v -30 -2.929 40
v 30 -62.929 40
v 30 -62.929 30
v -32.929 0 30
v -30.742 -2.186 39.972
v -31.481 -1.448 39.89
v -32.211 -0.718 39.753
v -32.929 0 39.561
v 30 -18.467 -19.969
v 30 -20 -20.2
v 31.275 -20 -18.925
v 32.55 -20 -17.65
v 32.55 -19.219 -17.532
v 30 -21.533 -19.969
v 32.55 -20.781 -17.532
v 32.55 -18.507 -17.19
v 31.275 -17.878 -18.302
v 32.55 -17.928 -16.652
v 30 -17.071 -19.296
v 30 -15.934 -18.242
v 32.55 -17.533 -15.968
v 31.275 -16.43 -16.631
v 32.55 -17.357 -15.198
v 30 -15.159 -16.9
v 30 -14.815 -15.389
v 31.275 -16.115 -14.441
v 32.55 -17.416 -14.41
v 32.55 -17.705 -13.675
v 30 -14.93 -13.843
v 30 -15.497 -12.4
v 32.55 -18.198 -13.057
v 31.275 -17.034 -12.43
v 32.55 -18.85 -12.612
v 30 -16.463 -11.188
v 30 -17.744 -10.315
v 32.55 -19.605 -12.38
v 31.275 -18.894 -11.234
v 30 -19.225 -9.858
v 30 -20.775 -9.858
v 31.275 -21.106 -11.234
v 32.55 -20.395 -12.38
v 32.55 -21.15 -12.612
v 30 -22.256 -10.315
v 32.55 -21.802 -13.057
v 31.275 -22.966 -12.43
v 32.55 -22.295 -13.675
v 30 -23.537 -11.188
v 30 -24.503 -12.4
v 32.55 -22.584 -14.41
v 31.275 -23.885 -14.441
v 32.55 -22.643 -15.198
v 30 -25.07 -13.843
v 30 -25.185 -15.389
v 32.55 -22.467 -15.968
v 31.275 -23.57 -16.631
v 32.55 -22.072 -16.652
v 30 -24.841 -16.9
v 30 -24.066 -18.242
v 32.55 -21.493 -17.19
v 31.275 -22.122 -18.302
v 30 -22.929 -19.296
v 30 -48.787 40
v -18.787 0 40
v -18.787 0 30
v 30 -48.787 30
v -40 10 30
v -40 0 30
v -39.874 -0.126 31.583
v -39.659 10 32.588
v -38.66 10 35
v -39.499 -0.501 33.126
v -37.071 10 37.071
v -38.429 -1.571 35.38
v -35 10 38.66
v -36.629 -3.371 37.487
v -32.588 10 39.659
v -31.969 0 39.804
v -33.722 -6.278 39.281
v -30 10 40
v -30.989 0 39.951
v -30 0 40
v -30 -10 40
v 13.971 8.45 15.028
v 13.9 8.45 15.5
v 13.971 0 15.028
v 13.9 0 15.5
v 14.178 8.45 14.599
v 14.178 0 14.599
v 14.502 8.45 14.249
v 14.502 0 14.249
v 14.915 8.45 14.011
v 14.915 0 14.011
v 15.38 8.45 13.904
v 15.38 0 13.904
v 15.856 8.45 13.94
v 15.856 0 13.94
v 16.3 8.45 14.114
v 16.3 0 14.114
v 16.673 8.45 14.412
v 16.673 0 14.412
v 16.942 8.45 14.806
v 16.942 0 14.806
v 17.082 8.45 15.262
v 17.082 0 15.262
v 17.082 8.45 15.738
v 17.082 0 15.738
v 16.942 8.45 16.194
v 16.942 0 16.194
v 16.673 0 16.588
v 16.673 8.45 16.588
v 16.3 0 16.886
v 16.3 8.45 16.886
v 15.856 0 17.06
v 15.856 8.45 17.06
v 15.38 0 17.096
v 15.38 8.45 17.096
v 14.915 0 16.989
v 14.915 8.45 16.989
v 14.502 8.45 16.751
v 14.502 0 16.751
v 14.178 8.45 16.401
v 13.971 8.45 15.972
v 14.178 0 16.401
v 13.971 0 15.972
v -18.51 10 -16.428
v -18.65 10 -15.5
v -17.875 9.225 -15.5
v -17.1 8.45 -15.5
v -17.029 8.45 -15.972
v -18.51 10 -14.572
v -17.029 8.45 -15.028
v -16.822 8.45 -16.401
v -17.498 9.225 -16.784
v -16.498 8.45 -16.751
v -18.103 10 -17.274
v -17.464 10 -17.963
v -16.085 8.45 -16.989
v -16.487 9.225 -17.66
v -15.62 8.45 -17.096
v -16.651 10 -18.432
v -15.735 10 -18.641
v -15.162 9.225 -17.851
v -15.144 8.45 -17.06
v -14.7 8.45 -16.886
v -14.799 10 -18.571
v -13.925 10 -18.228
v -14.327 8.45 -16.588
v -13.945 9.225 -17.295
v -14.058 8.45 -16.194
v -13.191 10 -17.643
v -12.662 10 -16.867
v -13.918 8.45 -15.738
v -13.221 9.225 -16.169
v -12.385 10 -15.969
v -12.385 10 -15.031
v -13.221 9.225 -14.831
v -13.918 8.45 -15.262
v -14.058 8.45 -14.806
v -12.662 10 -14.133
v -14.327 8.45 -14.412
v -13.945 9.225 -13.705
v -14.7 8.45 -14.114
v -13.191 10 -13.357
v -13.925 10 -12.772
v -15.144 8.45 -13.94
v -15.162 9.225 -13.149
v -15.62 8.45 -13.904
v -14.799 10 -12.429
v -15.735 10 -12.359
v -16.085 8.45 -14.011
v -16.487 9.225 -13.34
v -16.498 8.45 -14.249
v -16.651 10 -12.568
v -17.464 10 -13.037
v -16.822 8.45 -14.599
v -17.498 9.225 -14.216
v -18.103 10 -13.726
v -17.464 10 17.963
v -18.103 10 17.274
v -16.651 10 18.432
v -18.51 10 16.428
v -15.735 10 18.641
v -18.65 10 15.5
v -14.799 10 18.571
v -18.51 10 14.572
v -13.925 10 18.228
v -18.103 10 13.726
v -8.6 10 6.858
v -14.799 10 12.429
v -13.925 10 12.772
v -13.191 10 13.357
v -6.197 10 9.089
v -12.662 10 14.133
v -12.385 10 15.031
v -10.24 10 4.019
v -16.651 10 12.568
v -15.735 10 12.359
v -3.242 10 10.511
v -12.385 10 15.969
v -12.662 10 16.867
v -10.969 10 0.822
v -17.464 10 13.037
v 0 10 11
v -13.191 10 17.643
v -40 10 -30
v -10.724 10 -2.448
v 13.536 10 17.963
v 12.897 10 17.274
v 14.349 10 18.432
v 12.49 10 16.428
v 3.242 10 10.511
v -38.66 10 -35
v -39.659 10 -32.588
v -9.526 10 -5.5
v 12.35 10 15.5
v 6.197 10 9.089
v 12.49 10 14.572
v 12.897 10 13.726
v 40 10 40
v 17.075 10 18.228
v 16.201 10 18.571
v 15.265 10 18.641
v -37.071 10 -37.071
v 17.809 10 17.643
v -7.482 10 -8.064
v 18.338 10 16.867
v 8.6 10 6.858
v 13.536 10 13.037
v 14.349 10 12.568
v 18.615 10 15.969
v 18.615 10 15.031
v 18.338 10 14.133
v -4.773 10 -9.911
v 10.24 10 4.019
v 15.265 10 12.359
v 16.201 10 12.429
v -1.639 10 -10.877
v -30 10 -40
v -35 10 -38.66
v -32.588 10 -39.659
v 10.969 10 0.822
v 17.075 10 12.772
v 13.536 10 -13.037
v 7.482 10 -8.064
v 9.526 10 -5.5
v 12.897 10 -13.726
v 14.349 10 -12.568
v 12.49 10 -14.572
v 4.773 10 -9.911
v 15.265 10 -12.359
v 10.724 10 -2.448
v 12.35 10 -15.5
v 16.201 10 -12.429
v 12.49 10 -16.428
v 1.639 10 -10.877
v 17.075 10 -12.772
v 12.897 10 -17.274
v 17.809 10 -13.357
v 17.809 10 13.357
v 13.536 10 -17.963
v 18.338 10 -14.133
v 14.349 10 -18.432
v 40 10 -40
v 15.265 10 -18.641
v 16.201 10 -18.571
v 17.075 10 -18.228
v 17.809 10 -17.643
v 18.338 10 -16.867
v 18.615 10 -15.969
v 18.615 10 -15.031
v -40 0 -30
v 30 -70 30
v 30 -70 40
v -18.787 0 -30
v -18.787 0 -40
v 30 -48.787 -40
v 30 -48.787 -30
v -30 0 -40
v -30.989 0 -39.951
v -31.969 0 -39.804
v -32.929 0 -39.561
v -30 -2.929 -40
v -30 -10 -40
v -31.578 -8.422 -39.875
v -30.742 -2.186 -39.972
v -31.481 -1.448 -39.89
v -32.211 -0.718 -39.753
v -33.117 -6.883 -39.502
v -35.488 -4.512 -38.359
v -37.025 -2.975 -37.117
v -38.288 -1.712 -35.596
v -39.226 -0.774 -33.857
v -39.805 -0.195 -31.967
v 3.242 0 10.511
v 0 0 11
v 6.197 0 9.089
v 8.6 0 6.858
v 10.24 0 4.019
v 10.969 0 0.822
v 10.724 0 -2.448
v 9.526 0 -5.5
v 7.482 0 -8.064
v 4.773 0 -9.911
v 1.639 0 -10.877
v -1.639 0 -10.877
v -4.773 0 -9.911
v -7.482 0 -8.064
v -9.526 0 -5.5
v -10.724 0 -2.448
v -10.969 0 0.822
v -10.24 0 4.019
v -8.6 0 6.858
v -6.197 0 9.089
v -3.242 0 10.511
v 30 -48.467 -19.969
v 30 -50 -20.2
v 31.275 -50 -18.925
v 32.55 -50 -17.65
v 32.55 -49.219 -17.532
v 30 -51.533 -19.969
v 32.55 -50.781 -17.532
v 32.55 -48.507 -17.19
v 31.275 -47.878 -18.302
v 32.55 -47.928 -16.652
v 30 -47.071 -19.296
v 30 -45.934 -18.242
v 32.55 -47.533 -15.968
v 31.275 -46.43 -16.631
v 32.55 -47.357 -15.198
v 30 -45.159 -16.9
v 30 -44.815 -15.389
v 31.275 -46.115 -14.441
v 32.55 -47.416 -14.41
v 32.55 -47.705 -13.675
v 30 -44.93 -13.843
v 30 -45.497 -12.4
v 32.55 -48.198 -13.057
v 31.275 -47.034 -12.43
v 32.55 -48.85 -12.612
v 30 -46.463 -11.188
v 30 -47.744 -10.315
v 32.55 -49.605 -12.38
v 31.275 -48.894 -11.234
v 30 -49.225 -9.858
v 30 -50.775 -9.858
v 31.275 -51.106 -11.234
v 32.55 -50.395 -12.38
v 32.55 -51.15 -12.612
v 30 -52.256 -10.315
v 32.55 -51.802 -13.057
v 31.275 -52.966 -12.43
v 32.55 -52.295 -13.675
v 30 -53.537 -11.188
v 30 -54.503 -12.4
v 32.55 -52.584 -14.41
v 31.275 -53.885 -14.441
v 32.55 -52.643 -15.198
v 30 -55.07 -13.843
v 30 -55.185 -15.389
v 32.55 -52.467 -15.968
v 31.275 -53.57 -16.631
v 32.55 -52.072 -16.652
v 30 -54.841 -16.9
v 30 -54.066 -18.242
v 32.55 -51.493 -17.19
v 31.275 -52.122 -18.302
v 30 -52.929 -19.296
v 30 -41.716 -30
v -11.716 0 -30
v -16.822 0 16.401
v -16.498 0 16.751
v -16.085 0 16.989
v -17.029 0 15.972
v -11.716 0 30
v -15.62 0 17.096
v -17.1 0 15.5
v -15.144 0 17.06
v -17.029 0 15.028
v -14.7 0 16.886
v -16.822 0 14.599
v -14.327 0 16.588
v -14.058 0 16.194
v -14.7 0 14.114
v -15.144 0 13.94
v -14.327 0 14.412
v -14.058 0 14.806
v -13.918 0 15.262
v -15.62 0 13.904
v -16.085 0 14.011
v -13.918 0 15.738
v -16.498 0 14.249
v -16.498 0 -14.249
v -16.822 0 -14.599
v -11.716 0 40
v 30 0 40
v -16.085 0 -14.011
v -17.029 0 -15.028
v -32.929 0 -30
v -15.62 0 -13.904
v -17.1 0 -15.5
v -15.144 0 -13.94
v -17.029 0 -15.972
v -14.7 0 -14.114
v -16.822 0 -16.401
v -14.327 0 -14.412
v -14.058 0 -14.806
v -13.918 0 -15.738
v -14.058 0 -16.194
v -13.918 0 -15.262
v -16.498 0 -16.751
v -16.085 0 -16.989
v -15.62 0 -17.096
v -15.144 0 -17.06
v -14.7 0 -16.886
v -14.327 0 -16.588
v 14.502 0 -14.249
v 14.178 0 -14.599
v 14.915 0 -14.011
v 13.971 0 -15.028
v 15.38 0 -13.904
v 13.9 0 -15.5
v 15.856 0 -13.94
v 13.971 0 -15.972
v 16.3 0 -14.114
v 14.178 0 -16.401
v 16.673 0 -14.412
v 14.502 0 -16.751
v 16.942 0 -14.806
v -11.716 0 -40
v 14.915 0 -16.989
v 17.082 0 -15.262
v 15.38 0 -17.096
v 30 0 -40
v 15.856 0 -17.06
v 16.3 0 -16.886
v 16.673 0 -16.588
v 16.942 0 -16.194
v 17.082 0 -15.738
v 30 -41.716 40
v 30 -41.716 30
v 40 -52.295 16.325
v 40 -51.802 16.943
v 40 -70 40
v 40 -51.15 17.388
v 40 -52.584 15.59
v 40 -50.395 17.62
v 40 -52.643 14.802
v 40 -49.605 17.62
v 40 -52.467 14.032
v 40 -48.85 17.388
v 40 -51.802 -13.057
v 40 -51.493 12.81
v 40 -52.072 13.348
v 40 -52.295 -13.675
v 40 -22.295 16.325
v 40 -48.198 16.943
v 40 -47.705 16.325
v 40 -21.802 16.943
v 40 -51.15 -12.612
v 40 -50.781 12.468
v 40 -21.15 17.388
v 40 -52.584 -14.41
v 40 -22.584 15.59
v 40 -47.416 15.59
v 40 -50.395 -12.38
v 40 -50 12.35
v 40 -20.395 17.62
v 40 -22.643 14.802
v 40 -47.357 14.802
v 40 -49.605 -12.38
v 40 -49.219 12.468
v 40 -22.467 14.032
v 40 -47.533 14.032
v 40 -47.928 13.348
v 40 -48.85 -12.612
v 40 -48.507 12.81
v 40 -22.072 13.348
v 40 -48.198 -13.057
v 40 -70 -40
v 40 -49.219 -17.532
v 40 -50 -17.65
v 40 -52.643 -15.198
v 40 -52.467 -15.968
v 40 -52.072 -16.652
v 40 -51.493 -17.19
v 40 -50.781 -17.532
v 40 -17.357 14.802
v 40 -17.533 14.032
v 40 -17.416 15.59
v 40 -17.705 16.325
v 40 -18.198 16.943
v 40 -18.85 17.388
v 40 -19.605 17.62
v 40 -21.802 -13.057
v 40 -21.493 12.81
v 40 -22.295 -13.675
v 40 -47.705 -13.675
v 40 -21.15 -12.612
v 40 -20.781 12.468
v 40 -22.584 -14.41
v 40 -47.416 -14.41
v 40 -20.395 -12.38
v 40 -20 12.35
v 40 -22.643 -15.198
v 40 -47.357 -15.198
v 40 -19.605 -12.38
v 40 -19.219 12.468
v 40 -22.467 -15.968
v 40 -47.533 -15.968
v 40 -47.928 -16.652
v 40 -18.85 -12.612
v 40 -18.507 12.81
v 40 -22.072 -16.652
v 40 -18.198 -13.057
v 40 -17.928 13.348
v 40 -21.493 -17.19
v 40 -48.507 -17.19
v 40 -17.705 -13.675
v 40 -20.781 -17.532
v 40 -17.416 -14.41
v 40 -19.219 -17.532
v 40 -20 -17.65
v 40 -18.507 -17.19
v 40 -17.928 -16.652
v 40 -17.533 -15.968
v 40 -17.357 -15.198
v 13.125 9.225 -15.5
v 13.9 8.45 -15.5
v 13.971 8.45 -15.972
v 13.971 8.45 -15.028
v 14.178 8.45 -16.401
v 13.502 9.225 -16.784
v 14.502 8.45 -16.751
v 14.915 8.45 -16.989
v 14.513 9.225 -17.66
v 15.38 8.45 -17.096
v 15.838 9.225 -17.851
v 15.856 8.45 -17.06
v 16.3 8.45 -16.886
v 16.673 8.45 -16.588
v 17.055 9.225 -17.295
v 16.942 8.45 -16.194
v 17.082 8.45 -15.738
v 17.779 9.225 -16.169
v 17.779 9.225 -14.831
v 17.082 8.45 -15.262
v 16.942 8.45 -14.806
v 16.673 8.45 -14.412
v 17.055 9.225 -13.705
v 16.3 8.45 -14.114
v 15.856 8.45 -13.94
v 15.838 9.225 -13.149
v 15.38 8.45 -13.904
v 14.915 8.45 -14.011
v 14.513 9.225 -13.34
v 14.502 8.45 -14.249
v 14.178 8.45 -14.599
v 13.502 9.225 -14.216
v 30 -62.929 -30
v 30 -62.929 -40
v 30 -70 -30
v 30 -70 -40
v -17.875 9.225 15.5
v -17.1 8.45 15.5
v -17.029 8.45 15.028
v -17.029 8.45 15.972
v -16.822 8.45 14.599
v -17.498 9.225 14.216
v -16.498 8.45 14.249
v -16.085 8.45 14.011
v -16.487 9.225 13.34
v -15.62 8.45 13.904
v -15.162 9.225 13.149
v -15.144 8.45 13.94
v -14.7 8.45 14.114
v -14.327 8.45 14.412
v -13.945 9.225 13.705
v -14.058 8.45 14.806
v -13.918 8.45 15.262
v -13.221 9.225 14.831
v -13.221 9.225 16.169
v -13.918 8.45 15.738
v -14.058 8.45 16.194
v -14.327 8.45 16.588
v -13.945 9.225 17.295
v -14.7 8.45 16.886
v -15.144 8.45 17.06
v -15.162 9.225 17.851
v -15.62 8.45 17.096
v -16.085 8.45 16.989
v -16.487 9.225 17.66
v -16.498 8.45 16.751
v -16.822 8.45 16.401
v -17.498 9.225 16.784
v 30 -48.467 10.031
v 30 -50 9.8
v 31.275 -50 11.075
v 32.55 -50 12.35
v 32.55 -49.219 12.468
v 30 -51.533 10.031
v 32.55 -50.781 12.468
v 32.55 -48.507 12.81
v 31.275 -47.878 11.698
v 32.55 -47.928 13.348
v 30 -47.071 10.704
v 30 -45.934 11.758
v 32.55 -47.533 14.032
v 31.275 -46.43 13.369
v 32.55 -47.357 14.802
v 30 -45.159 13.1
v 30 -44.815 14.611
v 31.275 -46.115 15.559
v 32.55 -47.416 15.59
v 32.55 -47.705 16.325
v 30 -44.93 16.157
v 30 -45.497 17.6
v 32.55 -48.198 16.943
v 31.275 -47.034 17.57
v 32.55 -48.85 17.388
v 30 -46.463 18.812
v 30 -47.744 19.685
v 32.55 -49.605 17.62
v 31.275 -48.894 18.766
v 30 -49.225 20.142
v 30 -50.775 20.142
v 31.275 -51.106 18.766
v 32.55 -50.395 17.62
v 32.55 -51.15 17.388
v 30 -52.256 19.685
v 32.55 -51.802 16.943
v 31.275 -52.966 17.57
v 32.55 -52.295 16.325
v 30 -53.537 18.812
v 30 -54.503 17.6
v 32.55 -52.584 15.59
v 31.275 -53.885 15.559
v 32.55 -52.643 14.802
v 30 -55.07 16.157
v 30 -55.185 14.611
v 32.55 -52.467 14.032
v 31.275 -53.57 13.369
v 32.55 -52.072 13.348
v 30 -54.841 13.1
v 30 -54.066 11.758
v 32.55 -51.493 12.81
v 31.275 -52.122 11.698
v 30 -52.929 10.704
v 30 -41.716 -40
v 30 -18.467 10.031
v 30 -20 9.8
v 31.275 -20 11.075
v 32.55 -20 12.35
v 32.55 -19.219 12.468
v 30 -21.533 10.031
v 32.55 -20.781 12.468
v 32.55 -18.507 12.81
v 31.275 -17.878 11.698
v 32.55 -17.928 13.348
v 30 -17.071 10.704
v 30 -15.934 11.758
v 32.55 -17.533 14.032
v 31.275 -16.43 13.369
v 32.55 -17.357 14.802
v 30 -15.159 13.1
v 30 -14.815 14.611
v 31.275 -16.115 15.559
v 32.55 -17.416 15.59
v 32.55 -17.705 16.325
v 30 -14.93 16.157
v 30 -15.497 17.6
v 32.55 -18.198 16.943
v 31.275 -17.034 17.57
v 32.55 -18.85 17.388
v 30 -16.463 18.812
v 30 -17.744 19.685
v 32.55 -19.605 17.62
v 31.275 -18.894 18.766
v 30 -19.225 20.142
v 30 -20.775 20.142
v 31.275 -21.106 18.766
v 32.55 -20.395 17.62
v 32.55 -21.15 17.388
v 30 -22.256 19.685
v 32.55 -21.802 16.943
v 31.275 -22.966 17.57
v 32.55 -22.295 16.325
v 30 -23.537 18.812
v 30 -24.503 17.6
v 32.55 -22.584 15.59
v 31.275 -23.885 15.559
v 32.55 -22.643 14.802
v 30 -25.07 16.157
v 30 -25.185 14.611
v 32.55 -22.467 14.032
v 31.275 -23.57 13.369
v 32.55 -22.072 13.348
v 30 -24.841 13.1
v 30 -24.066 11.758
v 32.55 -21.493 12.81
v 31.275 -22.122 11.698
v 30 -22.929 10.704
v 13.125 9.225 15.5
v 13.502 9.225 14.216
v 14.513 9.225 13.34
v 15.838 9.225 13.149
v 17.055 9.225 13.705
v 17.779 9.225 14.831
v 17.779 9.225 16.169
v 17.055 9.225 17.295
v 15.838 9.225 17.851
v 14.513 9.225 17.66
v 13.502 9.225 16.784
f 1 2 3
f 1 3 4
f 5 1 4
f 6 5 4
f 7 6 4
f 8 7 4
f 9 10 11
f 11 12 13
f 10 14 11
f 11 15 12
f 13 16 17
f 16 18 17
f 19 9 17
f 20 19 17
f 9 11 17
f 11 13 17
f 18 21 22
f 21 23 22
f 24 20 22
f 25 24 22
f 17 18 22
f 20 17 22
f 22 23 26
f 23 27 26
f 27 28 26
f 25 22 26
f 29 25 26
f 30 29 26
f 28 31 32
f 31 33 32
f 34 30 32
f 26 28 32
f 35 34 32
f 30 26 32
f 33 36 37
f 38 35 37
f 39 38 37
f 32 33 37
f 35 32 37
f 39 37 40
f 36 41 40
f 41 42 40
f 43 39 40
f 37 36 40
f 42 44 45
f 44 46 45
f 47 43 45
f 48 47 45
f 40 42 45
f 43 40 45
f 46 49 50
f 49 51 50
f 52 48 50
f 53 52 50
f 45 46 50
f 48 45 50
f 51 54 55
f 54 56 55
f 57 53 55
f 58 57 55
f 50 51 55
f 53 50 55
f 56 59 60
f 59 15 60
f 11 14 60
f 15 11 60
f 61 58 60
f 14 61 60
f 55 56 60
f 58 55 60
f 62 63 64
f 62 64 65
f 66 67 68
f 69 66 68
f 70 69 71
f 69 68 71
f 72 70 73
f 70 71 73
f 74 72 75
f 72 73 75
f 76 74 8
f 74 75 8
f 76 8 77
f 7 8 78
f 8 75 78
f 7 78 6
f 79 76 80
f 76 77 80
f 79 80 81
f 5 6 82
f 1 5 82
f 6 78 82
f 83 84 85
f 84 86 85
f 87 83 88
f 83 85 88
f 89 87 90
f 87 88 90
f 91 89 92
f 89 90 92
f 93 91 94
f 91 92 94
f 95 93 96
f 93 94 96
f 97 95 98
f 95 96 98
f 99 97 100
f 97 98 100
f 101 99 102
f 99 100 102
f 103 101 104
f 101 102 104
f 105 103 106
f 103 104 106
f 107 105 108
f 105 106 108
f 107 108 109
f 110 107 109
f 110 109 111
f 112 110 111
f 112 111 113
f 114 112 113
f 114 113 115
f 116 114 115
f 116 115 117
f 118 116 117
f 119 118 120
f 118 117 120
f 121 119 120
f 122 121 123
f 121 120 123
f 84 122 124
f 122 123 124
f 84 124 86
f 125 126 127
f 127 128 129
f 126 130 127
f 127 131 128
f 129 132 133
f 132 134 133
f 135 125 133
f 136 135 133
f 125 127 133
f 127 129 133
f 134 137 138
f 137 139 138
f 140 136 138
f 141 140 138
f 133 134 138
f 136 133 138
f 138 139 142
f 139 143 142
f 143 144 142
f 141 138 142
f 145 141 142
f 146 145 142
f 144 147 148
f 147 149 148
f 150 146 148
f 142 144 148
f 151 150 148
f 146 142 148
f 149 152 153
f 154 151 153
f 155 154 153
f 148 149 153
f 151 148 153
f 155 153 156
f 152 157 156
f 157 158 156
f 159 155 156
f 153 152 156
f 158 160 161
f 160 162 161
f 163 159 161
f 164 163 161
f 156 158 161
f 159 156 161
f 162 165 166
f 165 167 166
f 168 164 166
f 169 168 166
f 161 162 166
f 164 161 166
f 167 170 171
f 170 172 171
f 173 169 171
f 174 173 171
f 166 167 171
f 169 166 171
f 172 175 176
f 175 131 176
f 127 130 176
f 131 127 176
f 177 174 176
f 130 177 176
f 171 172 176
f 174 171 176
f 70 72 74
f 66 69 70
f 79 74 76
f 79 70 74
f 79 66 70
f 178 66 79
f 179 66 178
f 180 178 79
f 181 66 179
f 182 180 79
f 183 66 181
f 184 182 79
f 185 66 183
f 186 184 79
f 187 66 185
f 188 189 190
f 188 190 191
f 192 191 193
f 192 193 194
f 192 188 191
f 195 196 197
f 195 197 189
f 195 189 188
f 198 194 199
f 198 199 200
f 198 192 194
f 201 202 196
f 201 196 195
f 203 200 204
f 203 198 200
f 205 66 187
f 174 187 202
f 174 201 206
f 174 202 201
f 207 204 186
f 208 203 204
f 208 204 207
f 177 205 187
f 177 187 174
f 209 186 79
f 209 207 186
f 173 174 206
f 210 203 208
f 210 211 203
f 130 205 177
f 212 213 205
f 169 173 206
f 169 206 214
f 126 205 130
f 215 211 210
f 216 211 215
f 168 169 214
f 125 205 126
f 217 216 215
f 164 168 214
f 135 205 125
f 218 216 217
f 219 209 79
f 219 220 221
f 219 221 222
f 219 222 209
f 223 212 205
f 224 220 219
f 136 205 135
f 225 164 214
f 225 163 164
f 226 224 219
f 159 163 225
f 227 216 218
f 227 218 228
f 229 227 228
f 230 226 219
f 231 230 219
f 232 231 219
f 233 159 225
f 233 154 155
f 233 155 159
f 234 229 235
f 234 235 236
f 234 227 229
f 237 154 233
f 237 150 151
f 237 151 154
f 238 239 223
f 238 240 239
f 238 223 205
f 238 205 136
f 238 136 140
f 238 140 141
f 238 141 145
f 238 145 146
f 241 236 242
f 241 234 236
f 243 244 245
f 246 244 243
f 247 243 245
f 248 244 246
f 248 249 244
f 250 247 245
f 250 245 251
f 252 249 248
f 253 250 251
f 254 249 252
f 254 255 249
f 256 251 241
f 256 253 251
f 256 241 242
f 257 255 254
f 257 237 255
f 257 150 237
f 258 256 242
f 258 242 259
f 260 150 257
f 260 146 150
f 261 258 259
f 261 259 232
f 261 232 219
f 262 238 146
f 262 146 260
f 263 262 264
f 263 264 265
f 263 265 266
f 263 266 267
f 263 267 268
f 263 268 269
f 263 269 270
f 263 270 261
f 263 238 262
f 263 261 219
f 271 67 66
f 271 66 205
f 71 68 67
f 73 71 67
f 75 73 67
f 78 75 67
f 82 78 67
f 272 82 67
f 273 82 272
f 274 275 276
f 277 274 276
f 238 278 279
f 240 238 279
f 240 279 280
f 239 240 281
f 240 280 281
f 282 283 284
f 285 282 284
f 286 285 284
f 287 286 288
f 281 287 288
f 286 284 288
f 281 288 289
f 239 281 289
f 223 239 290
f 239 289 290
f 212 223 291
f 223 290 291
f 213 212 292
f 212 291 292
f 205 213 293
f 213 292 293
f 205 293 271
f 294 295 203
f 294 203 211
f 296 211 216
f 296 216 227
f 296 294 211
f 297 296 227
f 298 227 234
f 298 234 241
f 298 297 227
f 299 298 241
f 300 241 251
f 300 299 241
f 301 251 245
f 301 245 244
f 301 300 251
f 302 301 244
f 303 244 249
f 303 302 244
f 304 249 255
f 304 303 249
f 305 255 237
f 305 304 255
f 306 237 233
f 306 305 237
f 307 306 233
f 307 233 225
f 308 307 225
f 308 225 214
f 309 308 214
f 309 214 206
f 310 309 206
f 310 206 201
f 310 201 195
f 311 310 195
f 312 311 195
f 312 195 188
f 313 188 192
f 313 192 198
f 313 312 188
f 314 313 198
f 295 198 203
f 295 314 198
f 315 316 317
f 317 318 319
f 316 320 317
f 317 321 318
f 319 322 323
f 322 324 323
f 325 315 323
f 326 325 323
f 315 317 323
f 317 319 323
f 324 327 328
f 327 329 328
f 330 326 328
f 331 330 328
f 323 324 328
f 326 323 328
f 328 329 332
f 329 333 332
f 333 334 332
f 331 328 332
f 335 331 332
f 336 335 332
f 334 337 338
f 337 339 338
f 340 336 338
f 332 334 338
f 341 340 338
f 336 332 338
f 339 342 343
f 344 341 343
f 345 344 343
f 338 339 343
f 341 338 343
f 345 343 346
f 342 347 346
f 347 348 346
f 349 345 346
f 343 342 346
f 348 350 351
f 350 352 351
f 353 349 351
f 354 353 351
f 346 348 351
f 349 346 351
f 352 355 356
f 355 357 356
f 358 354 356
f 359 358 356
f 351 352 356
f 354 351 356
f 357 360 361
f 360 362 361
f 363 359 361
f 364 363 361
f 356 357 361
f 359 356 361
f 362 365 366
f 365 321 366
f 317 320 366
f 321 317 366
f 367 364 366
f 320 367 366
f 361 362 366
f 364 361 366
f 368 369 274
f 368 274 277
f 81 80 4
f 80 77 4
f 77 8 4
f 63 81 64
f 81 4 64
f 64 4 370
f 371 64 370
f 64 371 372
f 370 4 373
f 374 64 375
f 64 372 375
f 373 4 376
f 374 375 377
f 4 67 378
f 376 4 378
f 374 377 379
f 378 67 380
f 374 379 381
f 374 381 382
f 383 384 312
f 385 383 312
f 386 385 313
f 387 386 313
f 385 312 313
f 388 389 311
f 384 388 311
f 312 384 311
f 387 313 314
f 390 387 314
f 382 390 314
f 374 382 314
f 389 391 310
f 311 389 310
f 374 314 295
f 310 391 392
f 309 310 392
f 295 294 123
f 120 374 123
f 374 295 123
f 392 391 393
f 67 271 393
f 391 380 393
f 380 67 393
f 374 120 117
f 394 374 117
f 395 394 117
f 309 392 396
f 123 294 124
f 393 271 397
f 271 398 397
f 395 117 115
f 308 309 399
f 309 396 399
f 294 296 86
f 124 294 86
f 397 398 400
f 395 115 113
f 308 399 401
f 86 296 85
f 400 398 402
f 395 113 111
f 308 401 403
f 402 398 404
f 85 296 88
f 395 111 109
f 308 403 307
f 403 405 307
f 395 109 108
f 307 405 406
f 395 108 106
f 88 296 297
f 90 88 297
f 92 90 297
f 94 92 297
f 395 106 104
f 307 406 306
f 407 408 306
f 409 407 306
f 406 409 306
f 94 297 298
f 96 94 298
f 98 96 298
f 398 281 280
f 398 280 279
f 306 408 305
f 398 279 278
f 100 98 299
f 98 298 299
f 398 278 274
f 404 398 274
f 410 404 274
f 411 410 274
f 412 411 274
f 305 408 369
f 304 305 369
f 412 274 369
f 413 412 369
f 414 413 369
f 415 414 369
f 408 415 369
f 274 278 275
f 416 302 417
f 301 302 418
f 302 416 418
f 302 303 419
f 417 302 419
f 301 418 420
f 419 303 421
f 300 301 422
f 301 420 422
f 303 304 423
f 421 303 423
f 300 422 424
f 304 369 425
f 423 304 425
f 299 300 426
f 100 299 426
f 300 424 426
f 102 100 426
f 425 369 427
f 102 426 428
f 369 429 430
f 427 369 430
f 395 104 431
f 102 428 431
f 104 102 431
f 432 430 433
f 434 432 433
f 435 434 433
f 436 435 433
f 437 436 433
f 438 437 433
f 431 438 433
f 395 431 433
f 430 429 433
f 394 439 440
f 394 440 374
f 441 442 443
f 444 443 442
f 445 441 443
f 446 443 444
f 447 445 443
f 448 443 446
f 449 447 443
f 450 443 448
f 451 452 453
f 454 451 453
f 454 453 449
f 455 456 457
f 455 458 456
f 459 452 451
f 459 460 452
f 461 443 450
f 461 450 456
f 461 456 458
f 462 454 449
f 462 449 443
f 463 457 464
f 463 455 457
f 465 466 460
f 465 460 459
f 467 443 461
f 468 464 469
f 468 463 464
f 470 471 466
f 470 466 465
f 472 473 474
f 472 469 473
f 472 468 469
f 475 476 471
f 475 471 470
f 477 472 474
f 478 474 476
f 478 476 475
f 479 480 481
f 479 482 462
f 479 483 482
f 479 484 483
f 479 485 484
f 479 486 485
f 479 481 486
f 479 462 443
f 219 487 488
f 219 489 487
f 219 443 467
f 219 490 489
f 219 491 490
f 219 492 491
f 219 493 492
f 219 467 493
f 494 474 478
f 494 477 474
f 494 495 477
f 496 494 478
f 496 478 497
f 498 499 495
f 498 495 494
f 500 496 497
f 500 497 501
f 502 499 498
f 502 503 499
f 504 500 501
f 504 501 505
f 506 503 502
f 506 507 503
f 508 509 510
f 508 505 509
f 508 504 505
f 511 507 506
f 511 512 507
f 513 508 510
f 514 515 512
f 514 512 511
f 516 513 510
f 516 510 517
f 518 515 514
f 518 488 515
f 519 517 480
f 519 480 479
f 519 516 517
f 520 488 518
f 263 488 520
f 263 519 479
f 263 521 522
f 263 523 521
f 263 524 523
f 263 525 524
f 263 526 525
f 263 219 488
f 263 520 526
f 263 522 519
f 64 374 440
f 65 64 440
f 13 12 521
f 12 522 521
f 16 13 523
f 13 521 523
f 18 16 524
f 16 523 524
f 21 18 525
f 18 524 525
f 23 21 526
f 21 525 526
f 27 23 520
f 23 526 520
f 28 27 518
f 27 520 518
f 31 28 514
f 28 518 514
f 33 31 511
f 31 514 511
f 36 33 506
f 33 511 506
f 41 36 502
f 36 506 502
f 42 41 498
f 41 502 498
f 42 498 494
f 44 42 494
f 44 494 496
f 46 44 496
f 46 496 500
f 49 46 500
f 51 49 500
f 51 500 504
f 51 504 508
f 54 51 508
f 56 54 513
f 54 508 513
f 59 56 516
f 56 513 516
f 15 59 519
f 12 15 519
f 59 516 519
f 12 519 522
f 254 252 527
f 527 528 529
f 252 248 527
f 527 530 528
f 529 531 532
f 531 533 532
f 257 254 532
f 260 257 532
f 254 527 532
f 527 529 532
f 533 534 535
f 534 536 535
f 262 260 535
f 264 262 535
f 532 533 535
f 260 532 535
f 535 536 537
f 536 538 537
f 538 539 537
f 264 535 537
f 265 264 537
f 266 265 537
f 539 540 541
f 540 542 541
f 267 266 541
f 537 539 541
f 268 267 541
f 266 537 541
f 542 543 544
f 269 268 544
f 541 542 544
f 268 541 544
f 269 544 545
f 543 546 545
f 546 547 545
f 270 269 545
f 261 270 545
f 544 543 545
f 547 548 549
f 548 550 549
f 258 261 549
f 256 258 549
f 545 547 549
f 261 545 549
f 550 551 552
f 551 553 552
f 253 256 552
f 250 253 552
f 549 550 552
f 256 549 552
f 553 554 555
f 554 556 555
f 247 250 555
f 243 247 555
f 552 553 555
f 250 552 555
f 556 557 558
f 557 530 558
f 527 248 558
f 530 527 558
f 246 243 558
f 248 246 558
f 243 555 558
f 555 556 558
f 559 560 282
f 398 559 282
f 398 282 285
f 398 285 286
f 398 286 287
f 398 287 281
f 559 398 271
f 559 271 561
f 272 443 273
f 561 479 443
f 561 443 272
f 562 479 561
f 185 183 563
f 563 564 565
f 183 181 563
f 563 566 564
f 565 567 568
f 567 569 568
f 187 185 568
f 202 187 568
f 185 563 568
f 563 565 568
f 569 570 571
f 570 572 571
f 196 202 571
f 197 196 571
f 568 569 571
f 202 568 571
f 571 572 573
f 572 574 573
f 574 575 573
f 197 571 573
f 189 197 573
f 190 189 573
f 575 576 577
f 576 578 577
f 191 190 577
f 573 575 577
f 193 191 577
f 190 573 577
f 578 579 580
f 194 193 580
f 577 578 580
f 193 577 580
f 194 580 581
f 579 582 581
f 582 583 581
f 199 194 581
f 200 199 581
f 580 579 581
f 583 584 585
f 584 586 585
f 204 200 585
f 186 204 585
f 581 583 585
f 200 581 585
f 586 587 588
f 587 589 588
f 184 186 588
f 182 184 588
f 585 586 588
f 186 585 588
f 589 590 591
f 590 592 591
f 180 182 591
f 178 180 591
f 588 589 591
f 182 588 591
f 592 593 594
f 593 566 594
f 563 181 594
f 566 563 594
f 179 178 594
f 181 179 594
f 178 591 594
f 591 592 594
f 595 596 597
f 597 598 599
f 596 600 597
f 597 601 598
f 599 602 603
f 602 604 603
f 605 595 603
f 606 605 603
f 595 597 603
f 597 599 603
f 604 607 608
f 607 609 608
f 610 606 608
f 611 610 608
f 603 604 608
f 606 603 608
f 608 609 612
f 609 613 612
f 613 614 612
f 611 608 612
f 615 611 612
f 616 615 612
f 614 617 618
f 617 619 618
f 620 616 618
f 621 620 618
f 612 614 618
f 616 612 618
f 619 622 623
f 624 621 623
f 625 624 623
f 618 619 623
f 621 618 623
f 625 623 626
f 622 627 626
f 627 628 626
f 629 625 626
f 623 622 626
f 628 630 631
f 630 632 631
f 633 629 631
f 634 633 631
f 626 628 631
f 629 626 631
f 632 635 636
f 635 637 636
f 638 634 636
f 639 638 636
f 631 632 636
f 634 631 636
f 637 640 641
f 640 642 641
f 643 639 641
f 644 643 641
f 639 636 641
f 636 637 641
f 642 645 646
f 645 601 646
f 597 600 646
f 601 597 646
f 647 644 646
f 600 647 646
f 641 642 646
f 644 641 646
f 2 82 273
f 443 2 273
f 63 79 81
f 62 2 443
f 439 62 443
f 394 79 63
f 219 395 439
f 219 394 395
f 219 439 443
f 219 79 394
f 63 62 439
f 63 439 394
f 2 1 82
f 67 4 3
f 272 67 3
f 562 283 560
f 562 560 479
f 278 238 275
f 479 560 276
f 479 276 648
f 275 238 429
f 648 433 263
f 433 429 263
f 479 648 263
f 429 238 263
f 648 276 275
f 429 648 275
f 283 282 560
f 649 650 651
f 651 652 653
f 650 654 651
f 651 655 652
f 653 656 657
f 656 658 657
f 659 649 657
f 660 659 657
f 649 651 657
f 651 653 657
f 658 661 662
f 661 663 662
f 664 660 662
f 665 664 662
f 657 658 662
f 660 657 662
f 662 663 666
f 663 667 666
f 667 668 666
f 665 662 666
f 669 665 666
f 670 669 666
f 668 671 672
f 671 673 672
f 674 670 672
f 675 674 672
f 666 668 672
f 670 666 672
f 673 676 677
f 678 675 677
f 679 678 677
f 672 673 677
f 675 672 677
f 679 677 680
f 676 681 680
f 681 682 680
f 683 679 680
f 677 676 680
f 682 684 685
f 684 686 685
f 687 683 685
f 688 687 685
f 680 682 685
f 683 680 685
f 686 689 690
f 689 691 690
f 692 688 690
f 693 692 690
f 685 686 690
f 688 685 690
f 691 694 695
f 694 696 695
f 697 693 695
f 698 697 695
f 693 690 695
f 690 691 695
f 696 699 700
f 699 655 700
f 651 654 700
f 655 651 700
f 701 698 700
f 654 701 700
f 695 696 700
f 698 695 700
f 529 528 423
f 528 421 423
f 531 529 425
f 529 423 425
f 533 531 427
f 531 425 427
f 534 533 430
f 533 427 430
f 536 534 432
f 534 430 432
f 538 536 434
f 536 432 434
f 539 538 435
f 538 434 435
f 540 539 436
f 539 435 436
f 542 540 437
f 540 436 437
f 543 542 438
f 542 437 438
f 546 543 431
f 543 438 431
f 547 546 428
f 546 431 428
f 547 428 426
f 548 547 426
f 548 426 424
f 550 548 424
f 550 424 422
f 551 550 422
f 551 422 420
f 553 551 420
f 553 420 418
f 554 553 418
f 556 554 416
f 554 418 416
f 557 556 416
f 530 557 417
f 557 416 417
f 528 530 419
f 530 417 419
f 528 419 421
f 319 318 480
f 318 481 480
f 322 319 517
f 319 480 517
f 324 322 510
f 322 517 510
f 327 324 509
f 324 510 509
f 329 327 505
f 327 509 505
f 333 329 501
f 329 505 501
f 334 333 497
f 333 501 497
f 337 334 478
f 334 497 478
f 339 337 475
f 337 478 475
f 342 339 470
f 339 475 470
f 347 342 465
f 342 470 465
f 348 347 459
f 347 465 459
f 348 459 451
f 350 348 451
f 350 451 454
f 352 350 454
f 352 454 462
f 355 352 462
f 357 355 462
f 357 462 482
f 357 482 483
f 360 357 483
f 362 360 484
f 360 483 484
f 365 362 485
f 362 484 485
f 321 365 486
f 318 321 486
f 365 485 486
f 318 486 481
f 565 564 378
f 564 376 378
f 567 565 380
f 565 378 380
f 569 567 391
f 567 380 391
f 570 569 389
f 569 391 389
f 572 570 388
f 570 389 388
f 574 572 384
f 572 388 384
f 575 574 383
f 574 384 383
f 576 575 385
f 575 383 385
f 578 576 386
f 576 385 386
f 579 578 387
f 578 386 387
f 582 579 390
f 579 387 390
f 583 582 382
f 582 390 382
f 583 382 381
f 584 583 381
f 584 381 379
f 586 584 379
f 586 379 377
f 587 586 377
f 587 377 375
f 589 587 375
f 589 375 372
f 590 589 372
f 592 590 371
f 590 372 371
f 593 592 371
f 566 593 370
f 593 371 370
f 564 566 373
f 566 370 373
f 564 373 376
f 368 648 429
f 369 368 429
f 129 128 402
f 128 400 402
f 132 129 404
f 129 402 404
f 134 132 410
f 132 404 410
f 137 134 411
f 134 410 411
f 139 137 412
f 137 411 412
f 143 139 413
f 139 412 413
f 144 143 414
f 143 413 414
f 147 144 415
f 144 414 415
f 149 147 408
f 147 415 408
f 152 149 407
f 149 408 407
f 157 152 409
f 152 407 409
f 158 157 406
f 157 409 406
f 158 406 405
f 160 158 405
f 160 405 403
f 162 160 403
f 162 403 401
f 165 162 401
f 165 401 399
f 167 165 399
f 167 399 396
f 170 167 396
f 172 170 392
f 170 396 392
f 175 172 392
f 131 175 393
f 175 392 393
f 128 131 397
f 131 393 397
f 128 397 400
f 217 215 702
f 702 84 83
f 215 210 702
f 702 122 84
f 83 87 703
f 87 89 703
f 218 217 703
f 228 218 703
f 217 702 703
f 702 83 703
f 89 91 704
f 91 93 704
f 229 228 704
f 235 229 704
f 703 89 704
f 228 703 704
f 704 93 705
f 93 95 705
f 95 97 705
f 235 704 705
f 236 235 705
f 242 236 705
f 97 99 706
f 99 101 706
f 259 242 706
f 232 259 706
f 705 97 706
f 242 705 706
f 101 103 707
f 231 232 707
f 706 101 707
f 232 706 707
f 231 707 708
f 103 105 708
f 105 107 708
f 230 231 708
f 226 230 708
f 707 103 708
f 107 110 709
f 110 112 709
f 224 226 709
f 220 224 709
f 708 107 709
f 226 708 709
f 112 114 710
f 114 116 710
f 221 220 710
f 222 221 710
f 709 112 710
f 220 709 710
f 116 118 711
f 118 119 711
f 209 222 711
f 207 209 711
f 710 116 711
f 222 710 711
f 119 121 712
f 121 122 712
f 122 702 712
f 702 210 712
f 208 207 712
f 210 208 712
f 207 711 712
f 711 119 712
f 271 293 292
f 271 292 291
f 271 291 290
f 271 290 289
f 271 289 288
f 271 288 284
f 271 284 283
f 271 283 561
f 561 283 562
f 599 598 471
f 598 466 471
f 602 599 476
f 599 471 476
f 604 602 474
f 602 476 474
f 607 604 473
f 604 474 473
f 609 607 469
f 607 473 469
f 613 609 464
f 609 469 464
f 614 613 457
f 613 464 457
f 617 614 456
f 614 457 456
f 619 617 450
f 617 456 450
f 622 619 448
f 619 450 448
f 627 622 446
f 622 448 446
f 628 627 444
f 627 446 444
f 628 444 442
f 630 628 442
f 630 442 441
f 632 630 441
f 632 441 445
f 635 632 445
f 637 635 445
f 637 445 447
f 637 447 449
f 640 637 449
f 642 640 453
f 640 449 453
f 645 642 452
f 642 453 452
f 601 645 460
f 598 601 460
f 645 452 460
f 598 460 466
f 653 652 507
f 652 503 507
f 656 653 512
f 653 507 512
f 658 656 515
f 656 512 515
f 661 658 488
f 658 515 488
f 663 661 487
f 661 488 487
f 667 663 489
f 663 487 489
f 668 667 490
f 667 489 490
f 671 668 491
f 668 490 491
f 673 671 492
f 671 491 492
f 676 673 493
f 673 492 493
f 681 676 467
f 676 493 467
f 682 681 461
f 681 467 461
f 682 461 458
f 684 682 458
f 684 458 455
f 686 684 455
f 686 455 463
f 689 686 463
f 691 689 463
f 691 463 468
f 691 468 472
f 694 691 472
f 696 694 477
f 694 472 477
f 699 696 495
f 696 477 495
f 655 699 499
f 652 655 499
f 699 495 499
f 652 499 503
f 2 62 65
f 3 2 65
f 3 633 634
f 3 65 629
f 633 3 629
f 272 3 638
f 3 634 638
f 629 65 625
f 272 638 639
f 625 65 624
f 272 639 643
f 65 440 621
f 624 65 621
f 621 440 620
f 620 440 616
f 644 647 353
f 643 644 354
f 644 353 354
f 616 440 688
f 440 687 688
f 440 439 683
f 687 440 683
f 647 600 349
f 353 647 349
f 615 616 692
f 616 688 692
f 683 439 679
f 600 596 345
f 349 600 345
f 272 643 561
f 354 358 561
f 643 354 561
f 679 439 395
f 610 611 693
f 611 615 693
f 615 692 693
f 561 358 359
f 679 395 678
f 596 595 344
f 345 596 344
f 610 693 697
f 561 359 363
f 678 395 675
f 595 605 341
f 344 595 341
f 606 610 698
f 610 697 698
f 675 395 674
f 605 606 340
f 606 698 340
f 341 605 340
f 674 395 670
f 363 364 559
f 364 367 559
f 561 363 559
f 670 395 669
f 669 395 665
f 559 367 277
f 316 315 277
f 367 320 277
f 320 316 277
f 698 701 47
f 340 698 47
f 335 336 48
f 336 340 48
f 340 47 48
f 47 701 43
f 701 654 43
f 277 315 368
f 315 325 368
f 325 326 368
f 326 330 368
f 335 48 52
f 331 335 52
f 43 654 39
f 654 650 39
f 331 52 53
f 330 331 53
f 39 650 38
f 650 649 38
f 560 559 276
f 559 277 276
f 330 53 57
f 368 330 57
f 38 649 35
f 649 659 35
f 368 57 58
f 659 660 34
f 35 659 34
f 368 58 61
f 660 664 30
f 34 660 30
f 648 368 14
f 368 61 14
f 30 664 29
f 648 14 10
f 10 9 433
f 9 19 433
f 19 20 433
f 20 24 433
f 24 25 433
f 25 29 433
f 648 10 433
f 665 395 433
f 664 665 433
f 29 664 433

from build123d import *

# Parameters (mm, degrees)
SKETCH1_W                                           = 80
SKETCH1_H                                           = 80
SKETCH1_R                                           = 11
BOSS_EXTRUDE1_DEPTH                                 = 10
CSK_FOR_M3_COUNTERSUNK_FLAT_HEAD_SCREW1_D           = 3.2
CSK_FOR_M3_COUNTERSUNK_FLAT_HEAD_SCREW1_CSINK_D     = 6.3
CSK_FOR_M3_COUNTERSUNK_FLAT_HEAD_SCREW1_CSINK_ANGLE = 90
SKETCH5_W                                           = 10
SKETCH5_H                                           = 80
BOSS_EXTRUDE2_DEPTH                                 = 70
BOSS_EXTRUDE3_DEPTH                                 = 10
CSK_FOR_M5_COUNTERSUNK_FLAT_HEAD_SCREW1_D           = 5.3
CSK_FOR_M5_COUNTERSUNK_FLAT_HEAD_SCREW1_CSINK_D     = 10.4
CSK_FOR_M5_COUNTERSUNK_FLAT_HEAD_SCREW1_CSINK_ANGLE = 90
FILLET1_R                                           = 10


with BuildPart() as part:
    # Sketch1 → Boss-Extrude1 (new body)
    with BuildSketch(Plane(origin=(0, 0, 0), x_dir=(1, 0, 0), z_dir=(0, 1, 0))):
        Rectangle(SKETCH1_W, SKETCH1_H)
        with Locations(Location((0, 0, 0), (0, 0, 270))):
            Circle(SKETCH1_R, mode=Mode.SUBTRACT)
    extrude(amount=BOSS_EXTRUDE1_DEPTH)

    # CSK for M3 Countersunk Flat Head Screw1 (through all)
    with Locations(Plane(origin=(0, 10, 0), x_dir=(1, 0, 0), z_dir=(0, 1, 0))):
        with Locations((-15.5, 15.5), (15.5, 15.5), (15.5, -15.5), (-15.5, -15.5)):
            CounterSinkHole(CSK_FOR_M3_COUNTERSUNK_FLAT_HEAD_SCREW1_D / 2, CSK_FOR_M3_COUNTERSUNK_FLAT_HEAD_SCREW1_CSINK_D / 2, counter_sink_angle=CSK_FOR_M3_COUNTERSUNK_FLAT_HEAD_SCREW1_CSINK_ANGLE)

    # Sketch5 → Boss-Extrude2 (add)
    with BuildSketch(Plane(origin=(0, 0, 0), x_dir=(-1, 0, 0), z_dir=(0, -1, 0))):
        with Locations((-35, 0)):
            Rectangle(SKETCH5_W, SKETCH5_H)
    extrude(amount=BOSS_EXTRUDE2_DEPTH)

    # Sketch6 → Boss-Extrude3 (add)
    with BuildSketch(Plane.XY.offset(40)):
        Polygon((-11.715728753, 0), (-18.786796564, 0), (-15.251262658, -3.535533906), (26.464466094, -45.251262658), (30, -48.786796564), (30, -41.715728753), align=None)
        Polygon((-32.928932188, 0), (-40, 0), (30, -70), (30, -62.928932188), align=None)
    boss_extrude3 = extrude(amount=-BOSS_EXTRUDE3_DEPTH)

    # Mirror1: Boss-Extrude3 across plane
    add(boss_extrude3.mirror(Plane.XY))

    # CSK for M5 Countersunk Flat Head Screw1 (through all)
    with Locations(Plane.ZY.offset(-30)):
        with Locations((15, -20), (15, -50), (-15, -50), (-15, -20)):
            CounterSinkHole(CSK_FOR_M5_COUNTERSUNK_FLAT_HEAD_SCREW1_D / 2, CSK_FOR_M5_COUNTERSUNK_FLAT_HEAD_SCREW1_CSINK_D / 2, counter_sink_angle=CSK_FOR_M5_COUNTERSUNK_FLAT_HEAD_SCREW1_CSINK_ANGLE)

    # Fillet1
    # the kernel refuses this fillet: 10 mm, written as the material it takes off along each edge
    with BuildSketch(Plane(origin=(-40, -25, -40), x_dir=(1, 0, 0), z_dir=(0, 1, 0))) as fillet1_piece_1:
        with BuildLine():
            CenterArc((FILLET1_R, -FILLET1_R), FILLET1_R, 90, 90)
            Line((0, -FILLET1_R), (0, 0))
            Line((0, 0), (FILLET1_R, 0))
        make_face()
    extrude(amount=60, mode=Mode.SUBTRACT)
    with BuildSketch(Plane(origin=(-40, -25, 40), x_dir=(1, 0, 0), z_dir=(0, 1, 0))) as fillet1_piece_2:
        with BuildLine():
            CenterArc((FILLET1_R, FILLET1_R), FILLET1_R, 180, 90)
            Line((0, FILLET1_R), (0, 0))
            Line((0, 0), (FILLET1_R, 0))
        make_face()
    extrude(amount=60, mode=Mode.SUBTRACT)


solid = part.part
